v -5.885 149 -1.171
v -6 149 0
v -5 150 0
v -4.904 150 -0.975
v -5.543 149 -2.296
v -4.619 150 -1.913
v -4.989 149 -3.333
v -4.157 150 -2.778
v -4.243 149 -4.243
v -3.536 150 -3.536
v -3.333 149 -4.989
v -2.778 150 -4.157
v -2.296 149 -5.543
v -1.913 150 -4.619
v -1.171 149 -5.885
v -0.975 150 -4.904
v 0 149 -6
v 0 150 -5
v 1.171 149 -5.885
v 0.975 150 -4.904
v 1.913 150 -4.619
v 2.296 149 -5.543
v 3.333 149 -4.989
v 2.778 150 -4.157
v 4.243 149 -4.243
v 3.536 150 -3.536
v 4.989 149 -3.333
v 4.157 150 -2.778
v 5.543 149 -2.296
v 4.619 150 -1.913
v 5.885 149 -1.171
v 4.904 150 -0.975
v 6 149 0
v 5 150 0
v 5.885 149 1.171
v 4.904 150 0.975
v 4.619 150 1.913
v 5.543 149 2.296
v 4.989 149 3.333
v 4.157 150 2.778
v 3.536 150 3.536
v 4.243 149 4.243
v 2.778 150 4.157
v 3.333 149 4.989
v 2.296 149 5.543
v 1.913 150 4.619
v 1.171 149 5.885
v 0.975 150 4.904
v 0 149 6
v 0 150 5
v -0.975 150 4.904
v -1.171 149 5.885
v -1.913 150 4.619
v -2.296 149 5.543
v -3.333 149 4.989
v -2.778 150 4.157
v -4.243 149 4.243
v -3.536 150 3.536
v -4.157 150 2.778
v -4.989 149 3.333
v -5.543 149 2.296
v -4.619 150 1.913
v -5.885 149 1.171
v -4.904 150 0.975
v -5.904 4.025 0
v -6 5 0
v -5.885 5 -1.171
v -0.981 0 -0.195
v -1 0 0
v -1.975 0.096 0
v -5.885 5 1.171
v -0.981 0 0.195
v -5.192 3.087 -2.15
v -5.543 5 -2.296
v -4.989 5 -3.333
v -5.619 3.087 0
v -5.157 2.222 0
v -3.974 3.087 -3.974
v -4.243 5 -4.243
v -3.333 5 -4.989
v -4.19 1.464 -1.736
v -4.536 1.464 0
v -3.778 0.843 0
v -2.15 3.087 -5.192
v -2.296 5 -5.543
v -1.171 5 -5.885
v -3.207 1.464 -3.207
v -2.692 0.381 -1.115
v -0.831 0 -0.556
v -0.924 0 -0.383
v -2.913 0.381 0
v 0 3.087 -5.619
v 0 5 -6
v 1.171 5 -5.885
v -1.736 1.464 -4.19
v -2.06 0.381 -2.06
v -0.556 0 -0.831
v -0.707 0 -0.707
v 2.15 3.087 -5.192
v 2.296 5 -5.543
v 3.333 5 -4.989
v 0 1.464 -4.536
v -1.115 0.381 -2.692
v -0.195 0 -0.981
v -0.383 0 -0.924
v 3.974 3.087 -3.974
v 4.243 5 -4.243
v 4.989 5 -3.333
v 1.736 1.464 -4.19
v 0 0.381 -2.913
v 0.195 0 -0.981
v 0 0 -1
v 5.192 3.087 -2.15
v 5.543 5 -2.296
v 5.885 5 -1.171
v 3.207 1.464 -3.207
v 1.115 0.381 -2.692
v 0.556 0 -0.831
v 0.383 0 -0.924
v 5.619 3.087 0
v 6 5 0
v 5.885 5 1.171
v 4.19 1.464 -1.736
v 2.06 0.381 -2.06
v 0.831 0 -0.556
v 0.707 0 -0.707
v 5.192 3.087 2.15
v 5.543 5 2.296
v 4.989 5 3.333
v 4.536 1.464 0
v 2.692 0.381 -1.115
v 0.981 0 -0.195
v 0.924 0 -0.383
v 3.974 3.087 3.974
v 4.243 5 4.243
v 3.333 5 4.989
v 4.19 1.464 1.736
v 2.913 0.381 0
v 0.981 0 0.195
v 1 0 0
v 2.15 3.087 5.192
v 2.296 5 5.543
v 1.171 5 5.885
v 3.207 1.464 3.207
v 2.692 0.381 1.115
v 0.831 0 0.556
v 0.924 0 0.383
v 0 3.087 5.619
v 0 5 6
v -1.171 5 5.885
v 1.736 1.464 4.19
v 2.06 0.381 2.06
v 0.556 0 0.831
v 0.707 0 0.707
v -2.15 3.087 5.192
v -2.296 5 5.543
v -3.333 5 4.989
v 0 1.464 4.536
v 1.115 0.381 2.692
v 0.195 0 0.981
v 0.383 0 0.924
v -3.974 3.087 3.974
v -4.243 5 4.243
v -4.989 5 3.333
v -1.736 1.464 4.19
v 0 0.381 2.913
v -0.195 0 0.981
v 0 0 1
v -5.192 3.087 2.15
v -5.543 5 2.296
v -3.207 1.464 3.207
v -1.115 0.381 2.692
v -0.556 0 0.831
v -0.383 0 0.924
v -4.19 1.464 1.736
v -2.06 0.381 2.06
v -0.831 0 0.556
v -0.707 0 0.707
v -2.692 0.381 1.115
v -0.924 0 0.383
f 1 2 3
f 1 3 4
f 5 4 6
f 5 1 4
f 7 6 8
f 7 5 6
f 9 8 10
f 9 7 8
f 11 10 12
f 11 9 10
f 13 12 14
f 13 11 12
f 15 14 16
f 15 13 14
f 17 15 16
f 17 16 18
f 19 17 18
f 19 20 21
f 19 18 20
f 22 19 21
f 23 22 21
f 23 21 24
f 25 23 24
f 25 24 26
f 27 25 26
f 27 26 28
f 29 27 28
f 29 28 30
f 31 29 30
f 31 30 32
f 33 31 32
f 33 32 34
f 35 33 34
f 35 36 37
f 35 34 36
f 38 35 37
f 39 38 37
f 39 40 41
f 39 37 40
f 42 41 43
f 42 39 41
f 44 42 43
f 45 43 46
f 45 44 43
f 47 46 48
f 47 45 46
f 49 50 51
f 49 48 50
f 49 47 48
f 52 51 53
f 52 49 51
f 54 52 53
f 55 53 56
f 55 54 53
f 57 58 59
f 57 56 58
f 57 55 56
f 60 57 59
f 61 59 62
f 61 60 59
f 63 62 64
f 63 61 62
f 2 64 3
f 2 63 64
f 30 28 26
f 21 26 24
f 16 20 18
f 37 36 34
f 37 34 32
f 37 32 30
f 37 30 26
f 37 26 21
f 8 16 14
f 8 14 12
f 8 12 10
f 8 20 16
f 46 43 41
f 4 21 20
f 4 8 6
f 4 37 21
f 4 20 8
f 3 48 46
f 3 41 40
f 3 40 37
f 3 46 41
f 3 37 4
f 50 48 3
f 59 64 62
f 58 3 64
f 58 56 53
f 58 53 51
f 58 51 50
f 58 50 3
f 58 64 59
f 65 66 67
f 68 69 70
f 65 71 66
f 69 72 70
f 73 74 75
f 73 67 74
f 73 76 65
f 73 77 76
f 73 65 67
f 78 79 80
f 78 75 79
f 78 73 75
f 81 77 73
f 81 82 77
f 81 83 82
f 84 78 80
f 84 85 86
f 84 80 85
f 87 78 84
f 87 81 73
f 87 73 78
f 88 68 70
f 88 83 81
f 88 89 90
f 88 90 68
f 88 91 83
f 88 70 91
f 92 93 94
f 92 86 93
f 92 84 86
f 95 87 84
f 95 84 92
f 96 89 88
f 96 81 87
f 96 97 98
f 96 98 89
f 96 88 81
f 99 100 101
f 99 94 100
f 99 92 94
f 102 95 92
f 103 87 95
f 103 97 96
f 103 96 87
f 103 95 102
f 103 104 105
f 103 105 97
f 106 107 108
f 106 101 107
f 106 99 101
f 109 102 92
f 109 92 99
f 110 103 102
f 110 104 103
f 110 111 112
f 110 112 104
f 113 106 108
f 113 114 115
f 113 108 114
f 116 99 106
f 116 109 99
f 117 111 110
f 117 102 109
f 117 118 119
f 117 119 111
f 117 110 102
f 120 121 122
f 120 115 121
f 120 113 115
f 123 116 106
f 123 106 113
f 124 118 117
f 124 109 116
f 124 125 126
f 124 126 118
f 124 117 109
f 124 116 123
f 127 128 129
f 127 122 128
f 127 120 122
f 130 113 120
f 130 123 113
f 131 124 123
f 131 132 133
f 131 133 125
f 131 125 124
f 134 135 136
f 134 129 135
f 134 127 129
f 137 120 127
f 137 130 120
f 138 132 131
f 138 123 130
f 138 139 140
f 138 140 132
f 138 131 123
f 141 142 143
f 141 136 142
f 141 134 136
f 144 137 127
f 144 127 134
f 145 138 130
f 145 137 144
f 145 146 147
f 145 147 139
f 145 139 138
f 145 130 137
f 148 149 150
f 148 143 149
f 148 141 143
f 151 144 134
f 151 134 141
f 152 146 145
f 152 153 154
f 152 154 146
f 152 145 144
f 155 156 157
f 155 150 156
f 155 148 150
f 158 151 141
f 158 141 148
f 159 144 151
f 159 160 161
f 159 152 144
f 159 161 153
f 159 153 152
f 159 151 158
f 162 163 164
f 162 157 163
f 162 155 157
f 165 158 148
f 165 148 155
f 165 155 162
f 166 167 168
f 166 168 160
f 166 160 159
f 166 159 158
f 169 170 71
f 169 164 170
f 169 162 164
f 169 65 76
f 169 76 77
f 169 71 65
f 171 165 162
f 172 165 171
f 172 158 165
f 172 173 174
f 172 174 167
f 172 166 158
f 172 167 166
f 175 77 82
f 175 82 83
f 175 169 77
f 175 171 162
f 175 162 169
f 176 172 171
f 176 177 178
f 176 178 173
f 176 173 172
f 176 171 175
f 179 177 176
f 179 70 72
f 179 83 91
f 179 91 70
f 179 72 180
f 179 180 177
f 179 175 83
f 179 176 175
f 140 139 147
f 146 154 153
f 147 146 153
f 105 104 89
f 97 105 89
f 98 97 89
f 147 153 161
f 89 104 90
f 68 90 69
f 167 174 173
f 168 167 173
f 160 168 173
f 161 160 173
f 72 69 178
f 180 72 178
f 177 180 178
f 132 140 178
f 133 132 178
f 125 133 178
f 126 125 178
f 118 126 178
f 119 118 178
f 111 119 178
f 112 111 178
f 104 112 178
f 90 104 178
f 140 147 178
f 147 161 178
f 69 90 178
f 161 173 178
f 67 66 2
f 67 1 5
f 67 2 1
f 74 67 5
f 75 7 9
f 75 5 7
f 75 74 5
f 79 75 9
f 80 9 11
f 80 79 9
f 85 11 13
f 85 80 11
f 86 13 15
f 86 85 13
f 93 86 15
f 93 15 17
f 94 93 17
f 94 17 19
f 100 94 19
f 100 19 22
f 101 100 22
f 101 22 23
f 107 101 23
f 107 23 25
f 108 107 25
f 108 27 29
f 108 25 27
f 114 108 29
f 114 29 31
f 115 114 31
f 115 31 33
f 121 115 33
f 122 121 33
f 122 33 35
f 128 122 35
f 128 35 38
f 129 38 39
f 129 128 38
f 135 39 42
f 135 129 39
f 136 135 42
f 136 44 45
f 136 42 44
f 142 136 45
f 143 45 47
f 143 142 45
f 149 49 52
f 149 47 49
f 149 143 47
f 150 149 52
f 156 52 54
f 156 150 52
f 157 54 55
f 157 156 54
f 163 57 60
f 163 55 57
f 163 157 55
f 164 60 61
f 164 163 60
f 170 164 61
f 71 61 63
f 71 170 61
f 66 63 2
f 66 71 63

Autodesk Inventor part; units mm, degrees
ref_plane "YZ Plane" through (0, 0, 0) normal (1, 0, 0) x (0, 1, 0)
ref_plane "XZ Plane" through (0, 0, 0) normal (0, 1, 0) x (-1, 0, 0)
ref_plane "XY Plane" through (0, 0, 0) normal (0, 0, 1) x (1, 0, 0)
sketch "Sketch1" plane through (0, 0, 0) normal (0, 1, 0) x (-1, 0, 0)
  circle A0 centre (0, 0) radius 6
  dimension "d0" = 12
extrude "Extrusion1" add sketch "Sketch1" along normal blind 150
thread "Thread1" size "M12x1" class "6g" standard "ISO Metric profile" length 11
chamfer "Chamfer1" distance 1 angle 45 1 edges at (6, 150, 0)
fillet "Fillet1" radius 5 1 edges at (6, 0, 0)
properties part number "Griff"
